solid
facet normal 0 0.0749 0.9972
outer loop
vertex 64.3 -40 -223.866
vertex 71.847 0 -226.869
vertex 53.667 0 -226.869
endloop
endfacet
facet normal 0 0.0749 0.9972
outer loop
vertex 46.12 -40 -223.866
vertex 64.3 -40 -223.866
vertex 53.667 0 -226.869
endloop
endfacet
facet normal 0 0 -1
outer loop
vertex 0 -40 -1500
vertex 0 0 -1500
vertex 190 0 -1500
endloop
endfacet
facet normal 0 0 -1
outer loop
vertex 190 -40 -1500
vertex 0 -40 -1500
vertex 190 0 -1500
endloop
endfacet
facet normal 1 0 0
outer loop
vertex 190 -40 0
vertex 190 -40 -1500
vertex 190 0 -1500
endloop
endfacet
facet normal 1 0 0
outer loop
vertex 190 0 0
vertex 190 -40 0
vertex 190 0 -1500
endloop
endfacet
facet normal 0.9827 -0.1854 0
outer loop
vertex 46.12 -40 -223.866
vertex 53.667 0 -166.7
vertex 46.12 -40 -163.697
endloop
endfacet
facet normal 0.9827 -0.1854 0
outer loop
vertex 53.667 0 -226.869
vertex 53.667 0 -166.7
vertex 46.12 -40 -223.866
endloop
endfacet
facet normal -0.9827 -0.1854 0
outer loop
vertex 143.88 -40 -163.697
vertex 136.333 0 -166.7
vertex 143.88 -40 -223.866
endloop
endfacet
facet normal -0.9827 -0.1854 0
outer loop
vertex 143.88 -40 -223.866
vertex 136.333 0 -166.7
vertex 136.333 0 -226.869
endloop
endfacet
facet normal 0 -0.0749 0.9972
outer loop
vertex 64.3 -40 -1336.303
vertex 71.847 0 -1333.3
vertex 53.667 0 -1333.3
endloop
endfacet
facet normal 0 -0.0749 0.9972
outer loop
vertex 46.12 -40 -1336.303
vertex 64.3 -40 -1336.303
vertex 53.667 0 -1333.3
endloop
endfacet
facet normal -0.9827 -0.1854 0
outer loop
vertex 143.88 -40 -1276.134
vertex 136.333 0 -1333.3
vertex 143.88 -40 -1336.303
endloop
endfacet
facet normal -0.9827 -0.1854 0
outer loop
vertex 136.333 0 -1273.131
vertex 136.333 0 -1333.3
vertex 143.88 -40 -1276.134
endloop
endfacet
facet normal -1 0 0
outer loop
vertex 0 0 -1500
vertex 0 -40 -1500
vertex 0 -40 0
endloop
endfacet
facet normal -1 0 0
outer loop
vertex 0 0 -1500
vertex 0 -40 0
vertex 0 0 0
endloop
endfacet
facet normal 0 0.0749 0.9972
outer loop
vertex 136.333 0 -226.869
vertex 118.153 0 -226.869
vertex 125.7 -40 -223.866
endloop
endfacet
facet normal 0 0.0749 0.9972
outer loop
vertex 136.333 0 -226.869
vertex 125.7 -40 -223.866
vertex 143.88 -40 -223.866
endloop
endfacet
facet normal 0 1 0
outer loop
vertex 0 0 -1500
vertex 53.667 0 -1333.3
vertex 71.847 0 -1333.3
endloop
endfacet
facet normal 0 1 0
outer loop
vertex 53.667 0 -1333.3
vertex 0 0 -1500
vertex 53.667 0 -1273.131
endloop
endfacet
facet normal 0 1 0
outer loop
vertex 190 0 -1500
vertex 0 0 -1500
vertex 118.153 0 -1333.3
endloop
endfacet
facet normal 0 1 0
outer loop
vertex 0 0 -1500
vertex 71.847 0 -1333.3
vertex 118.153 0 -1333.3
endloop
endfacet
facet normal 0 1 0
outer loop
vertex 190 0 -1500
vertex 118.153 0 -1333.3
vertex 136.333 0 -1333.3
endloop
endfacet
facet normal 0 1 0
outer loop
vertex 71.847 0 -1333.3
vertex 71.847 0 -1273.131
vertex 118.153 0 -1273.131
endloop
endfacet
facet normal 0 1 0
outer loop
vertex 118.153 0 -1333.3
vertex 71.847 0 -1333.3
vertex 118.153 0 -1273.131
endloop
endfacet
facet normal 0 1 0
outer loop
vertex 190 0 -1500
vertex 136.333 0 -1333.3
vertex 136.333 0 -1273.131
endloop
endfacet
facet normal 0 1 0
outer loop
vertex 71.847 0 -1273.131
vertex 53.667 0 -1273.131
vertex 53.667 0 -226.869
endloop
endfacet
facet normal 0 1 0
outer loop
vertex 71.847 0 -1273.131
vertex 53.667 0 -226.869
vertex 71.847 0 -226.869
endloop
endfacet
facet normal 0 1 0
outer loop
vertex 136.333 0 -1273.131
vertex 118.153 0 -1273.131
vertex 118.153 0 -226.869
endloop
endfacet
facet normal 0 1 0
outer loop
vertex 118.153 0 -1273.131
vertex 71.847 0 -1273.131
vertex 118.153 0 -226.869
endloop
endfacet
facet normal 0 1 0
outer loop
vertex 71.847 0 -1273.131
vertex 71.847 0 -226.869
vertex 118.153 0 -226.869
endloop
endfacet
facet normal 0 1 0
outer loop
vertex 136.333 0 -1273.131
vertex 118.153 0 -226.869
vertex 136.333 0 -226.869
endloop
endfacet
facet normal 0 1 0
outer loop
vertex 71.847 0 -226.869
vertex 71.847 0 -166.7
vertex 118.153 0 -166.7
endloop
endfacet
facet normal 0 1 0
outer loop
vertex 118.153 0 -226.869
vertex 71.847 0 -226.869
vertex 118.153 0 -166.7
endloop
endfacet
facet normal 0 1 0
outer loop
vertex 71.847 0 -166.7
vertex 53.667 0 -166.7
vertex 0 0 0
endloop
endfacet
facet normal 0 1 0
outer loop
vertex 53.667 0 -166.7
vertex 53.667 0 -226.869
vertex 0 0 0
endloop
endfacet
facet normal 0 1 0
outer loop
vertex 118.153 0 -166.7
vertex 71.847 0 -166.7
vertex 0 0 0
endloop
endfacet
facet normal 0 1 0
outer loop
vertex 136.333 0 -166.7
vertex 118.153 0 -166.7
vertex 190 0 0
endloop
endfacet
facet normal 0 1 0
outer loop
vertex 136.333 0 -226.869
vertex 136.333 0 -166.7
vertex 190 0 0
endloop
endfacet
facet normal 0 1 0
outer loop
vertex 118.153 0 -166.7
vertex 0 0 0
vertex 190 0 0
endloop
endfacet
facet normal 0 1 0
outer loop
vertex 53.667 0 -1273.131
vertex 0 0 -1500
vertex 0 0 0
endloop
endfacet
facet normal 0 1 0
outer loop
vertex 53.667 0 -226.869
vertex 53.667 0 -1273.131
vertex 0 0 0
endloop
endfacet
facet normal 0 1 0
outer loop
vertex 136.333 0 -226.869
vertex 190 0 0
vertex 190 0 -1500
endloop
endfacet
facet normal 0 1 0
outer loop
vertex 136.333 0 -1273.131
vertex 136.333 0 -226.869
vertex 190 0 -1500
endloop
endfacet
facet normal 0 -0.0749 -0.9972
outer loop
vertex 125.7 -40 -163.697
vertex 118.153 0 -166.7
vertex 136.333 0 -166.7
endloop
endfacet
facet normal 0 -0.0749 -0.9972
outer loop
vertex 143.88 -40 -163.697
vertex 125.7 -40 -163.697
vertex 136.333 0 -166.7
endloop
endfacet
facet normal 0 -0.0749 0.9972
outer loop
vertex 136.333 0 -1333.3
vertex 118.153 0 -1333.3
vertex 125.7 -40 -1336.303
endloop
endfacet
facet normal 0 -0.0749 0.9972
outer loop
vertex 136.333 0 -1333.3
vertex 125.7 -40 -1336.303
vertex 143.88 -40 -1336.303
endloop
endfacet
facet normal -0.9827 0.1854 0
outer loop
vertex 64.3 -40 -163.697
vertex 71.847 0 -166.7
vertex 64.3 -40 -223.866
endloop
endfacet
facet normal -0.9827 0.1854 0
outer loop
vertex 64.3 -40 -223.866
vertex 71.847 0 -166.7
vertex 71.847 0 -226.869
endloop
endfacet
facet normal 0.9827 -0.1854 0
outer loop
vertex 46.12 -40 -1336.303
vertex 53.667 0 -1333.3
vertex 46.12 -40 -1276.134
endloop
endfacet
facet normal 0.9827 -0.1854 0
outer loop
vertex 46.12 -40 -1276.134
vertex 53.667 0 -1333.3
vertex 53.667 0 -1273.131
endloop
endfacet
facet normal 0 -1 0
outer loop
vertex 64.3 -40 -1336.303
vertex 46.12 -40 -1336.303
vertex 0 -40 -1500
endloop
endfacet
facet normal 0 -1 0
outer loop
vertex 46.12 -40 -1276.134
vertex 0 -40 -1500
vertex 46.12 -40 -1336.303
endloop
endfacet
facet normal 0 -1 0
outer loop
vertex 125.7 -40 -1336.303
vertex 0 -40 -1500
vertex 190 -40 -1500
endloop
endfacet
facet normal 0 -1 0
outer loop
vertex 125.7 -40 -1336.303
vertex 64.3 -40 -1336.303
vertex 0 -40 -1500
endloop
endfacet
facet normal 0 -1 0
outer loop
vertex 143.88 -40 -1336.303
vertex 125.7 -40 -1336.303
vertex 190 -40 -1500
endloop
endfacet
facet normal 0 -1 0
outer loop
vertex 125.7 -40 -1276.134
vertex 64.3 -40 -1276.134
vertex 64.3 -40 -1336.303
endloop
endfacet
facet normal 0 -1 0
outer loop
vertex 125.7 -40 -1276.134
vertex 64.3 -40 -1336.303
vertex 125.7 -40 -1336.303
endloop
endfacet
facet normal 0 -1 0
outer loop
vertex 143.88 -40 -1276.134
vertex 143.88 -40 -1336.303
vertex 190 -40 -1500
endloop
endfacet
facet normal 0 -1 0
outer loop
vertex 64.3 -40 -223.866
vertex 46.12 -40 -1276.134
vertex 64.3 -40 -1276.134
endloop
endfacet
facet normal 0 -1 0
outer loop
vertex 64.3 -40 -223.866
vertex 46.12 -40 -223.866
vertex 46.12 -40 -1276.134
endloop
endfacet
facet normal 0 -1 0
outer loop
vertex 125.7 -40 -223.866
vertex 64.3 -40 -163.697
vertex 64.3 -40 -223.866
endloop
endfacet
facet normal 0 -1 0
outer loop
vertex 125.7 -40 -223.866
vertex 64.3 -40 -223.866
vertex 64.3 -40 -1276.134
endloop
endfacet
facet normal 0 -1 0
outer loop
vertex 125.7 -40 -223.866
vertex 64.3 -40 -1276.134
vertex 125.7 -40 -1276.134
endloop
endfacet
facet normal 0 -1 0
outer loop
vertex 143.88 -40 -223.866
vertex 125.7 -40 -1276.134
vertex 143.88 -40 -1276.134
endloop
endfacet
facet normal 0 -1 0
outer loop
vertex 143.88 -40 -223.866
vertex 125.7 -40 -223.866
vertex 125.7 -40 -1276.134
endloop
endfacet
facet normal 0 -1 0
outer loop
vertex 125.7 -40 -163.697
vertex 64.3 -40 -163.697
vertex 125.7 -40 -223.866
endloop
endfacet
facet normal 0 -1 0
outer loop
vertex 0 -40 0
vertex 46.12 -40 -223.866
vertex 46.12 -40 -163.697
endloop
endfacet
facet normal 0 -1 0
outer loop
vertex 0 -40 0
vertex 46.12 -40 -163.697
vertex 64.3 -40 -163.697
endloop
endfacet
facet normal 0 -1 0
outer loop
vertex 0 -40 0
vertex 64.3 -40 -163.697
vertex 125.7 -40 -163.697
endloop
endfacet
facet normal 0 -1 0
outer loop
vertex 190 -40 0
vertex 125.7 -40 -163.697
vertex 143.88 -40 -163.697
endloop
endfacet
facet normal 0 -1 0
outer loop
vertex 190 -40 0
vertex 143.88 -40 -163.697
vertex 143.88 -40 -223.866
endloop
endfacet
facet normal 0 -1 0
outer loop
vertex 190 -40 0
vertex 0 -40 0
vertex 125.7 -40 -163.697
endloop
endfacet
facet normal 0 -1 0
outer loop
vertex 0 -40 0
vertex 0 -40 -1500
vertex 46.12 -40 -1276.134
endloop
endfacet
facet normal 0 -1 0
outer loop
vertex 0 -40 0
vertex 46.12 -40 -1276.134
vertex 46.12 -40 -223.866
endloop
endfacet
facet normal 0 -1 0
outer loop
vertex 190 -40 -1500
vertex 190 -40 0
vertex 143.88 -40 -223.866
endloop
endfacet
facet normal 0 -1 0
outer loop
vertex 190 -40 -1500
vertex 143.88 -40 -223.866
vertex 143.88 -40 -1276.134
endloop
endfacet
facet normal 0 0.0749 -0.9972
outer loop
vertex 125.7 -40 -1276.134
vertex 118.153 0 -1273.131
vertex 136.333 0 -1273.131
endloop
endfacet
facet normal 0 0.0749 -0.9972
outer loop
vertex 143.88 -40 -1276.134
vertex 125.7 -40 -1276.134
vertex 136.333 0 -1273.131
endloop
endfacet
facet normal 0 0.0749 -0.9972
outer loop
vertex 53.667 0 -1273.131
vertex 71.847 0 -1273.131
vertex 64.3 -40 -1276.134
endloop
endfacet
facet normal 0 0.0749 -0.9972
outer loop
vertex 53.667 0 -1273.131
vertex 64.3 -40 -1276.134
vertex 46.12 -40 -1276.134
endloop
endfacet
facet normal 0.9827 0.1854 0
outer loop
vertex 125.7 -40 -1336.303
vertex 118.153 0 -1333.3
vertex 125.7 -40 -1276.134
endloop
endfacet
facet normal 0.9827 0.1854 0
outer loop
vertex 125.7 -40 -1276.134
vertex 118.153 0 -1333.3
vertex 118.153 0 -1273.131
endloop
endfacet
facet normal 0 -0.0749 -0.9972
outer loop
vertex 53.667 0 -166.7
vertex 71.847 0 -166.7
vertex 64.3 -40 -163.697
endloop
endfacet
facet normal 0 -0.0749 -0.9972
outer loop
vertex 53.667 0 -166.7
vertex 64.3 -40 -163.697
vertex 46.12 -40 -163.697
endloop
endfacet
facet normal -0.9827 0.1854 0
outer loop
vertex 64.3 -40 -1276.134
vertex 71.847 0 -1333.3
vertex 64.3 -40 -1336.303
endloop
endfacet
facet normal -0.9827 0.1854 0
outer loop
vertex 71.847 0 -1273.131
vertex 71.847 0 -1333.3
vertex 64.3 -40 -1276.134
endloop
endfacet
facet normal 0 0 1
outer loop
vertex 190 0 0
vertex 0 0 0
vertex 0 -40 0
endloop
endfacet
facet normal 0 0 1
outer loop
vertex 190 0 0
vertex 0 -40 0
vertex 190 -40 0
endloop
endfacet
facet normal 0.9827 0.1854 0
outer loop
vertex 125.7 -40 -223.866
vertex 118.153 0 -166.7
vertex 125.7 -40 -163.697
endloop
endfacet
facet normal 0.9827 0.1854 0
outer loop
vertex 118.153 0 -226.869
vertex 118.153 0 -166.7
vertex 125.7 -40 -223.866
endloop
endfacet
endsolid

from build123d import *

# Parameters (mm, degrees)
SKETCH_1_W               = 190
SKETCH_1_H               = 40
EXTRUDE_1_DEPTH          = 1500
SKETCH_4_W               = 18.18
SKETCH_4_H               = 60.16888381
CUT_EXTRUDE_1_DEPTH      = 1500
MIRROR_2_COPY_1_SKETCH_W = 18.18
MIRROR_2_COPY_1_SKETCH_H = 60.16888381
MIRROR_2_COPY_1_DEPTH    = 1500
MIRROR_2_COPY_2_SKETCH_W = 18.18
MIRROR_2_COPY_2_SKETCH_H = 60.16888381
MIRROR_2_COPY_2_DEPTH    = 1500


with BuildPart() as part:
    # 草圖1 → 填料-伸長1 (new body)
    with BuildSketch(Plane.XY):
        with Locations((95, -20)):
            Rectangle(SKETCH_1_W, SKETCH_1_H)
    extrude(amount=-EXTRUDE_1_DEPTH)

    # 草圖4 → 除料-伸長1 (cut, along a direction that is not the sketch's normal)
    with BuildSketch(Plane(origin=(0, 0, 0), x_dir=(1, 0, 0), z_dir=(0, 1, 0))):
        with Locations((127.243345581, 196.784441905)):
            Rectangle(SKETCH_4_W, SKETCH_4_H)
    cut_extrude_1 = extrude(amount=-CUT_EXTRUDE_1_DEPTH, dir=(-0.18489307241243372, 0.9800002075530074, -0.07358087366940451), mode=Mode.SUBTRACT)

    # 鏡射1: 除料-伸長1 across plane
    add(cut_extrude_1.mirror(Plane.XY.offset(-750)), mode=Mode.SUBTRACT)

    # 鏡射2 copy 1 sketch → 鏡射2 copy 1 (cut, along a direction that is not the sketch's normal)
    with BuildSketch(Plane(origin=(190, 0, -1500), x_dir=(-1, 0, 0), z_dir=(0, 1, 0))):
        with Locations((127.243345581, 196.784441905)):
            Rectangle(MIRROR_2_COPY_1_SKETCH_W, MIRROR_2_COPY_1_SKETCH_H)
    extrude(amount=-MIRROR_2_COPY_1_DEPTH, dir=(0.18489307241243372, 0.9800002075530074, 0.07358087366940451), mode=Mode.SUBTRACT)

    # 鏡射2 copy 2 sketch → 鏡射2 copy 2 (cut, along a direction that is not the sketch's normal)
    with BuildSketch(Plane(origin=(190, 0, 0), x_dir=(-1, 0, 0), z_dir=(0, 1, 0))):
        with Locations((127.243345581, -196.784441905)):
            Rectangle(MIRROR_2_COPY_2_SKETCH_W, MIRROR_2_COPY_2_SKETCH_H)
    extrude(amount=-MIRROR_2_COPY_2_DEPTH, dir=(0.18489307241243372, 0.9800002075530074, -0.07358087366940451), mode=Mode.SUBTRACT)


solid = part.part
